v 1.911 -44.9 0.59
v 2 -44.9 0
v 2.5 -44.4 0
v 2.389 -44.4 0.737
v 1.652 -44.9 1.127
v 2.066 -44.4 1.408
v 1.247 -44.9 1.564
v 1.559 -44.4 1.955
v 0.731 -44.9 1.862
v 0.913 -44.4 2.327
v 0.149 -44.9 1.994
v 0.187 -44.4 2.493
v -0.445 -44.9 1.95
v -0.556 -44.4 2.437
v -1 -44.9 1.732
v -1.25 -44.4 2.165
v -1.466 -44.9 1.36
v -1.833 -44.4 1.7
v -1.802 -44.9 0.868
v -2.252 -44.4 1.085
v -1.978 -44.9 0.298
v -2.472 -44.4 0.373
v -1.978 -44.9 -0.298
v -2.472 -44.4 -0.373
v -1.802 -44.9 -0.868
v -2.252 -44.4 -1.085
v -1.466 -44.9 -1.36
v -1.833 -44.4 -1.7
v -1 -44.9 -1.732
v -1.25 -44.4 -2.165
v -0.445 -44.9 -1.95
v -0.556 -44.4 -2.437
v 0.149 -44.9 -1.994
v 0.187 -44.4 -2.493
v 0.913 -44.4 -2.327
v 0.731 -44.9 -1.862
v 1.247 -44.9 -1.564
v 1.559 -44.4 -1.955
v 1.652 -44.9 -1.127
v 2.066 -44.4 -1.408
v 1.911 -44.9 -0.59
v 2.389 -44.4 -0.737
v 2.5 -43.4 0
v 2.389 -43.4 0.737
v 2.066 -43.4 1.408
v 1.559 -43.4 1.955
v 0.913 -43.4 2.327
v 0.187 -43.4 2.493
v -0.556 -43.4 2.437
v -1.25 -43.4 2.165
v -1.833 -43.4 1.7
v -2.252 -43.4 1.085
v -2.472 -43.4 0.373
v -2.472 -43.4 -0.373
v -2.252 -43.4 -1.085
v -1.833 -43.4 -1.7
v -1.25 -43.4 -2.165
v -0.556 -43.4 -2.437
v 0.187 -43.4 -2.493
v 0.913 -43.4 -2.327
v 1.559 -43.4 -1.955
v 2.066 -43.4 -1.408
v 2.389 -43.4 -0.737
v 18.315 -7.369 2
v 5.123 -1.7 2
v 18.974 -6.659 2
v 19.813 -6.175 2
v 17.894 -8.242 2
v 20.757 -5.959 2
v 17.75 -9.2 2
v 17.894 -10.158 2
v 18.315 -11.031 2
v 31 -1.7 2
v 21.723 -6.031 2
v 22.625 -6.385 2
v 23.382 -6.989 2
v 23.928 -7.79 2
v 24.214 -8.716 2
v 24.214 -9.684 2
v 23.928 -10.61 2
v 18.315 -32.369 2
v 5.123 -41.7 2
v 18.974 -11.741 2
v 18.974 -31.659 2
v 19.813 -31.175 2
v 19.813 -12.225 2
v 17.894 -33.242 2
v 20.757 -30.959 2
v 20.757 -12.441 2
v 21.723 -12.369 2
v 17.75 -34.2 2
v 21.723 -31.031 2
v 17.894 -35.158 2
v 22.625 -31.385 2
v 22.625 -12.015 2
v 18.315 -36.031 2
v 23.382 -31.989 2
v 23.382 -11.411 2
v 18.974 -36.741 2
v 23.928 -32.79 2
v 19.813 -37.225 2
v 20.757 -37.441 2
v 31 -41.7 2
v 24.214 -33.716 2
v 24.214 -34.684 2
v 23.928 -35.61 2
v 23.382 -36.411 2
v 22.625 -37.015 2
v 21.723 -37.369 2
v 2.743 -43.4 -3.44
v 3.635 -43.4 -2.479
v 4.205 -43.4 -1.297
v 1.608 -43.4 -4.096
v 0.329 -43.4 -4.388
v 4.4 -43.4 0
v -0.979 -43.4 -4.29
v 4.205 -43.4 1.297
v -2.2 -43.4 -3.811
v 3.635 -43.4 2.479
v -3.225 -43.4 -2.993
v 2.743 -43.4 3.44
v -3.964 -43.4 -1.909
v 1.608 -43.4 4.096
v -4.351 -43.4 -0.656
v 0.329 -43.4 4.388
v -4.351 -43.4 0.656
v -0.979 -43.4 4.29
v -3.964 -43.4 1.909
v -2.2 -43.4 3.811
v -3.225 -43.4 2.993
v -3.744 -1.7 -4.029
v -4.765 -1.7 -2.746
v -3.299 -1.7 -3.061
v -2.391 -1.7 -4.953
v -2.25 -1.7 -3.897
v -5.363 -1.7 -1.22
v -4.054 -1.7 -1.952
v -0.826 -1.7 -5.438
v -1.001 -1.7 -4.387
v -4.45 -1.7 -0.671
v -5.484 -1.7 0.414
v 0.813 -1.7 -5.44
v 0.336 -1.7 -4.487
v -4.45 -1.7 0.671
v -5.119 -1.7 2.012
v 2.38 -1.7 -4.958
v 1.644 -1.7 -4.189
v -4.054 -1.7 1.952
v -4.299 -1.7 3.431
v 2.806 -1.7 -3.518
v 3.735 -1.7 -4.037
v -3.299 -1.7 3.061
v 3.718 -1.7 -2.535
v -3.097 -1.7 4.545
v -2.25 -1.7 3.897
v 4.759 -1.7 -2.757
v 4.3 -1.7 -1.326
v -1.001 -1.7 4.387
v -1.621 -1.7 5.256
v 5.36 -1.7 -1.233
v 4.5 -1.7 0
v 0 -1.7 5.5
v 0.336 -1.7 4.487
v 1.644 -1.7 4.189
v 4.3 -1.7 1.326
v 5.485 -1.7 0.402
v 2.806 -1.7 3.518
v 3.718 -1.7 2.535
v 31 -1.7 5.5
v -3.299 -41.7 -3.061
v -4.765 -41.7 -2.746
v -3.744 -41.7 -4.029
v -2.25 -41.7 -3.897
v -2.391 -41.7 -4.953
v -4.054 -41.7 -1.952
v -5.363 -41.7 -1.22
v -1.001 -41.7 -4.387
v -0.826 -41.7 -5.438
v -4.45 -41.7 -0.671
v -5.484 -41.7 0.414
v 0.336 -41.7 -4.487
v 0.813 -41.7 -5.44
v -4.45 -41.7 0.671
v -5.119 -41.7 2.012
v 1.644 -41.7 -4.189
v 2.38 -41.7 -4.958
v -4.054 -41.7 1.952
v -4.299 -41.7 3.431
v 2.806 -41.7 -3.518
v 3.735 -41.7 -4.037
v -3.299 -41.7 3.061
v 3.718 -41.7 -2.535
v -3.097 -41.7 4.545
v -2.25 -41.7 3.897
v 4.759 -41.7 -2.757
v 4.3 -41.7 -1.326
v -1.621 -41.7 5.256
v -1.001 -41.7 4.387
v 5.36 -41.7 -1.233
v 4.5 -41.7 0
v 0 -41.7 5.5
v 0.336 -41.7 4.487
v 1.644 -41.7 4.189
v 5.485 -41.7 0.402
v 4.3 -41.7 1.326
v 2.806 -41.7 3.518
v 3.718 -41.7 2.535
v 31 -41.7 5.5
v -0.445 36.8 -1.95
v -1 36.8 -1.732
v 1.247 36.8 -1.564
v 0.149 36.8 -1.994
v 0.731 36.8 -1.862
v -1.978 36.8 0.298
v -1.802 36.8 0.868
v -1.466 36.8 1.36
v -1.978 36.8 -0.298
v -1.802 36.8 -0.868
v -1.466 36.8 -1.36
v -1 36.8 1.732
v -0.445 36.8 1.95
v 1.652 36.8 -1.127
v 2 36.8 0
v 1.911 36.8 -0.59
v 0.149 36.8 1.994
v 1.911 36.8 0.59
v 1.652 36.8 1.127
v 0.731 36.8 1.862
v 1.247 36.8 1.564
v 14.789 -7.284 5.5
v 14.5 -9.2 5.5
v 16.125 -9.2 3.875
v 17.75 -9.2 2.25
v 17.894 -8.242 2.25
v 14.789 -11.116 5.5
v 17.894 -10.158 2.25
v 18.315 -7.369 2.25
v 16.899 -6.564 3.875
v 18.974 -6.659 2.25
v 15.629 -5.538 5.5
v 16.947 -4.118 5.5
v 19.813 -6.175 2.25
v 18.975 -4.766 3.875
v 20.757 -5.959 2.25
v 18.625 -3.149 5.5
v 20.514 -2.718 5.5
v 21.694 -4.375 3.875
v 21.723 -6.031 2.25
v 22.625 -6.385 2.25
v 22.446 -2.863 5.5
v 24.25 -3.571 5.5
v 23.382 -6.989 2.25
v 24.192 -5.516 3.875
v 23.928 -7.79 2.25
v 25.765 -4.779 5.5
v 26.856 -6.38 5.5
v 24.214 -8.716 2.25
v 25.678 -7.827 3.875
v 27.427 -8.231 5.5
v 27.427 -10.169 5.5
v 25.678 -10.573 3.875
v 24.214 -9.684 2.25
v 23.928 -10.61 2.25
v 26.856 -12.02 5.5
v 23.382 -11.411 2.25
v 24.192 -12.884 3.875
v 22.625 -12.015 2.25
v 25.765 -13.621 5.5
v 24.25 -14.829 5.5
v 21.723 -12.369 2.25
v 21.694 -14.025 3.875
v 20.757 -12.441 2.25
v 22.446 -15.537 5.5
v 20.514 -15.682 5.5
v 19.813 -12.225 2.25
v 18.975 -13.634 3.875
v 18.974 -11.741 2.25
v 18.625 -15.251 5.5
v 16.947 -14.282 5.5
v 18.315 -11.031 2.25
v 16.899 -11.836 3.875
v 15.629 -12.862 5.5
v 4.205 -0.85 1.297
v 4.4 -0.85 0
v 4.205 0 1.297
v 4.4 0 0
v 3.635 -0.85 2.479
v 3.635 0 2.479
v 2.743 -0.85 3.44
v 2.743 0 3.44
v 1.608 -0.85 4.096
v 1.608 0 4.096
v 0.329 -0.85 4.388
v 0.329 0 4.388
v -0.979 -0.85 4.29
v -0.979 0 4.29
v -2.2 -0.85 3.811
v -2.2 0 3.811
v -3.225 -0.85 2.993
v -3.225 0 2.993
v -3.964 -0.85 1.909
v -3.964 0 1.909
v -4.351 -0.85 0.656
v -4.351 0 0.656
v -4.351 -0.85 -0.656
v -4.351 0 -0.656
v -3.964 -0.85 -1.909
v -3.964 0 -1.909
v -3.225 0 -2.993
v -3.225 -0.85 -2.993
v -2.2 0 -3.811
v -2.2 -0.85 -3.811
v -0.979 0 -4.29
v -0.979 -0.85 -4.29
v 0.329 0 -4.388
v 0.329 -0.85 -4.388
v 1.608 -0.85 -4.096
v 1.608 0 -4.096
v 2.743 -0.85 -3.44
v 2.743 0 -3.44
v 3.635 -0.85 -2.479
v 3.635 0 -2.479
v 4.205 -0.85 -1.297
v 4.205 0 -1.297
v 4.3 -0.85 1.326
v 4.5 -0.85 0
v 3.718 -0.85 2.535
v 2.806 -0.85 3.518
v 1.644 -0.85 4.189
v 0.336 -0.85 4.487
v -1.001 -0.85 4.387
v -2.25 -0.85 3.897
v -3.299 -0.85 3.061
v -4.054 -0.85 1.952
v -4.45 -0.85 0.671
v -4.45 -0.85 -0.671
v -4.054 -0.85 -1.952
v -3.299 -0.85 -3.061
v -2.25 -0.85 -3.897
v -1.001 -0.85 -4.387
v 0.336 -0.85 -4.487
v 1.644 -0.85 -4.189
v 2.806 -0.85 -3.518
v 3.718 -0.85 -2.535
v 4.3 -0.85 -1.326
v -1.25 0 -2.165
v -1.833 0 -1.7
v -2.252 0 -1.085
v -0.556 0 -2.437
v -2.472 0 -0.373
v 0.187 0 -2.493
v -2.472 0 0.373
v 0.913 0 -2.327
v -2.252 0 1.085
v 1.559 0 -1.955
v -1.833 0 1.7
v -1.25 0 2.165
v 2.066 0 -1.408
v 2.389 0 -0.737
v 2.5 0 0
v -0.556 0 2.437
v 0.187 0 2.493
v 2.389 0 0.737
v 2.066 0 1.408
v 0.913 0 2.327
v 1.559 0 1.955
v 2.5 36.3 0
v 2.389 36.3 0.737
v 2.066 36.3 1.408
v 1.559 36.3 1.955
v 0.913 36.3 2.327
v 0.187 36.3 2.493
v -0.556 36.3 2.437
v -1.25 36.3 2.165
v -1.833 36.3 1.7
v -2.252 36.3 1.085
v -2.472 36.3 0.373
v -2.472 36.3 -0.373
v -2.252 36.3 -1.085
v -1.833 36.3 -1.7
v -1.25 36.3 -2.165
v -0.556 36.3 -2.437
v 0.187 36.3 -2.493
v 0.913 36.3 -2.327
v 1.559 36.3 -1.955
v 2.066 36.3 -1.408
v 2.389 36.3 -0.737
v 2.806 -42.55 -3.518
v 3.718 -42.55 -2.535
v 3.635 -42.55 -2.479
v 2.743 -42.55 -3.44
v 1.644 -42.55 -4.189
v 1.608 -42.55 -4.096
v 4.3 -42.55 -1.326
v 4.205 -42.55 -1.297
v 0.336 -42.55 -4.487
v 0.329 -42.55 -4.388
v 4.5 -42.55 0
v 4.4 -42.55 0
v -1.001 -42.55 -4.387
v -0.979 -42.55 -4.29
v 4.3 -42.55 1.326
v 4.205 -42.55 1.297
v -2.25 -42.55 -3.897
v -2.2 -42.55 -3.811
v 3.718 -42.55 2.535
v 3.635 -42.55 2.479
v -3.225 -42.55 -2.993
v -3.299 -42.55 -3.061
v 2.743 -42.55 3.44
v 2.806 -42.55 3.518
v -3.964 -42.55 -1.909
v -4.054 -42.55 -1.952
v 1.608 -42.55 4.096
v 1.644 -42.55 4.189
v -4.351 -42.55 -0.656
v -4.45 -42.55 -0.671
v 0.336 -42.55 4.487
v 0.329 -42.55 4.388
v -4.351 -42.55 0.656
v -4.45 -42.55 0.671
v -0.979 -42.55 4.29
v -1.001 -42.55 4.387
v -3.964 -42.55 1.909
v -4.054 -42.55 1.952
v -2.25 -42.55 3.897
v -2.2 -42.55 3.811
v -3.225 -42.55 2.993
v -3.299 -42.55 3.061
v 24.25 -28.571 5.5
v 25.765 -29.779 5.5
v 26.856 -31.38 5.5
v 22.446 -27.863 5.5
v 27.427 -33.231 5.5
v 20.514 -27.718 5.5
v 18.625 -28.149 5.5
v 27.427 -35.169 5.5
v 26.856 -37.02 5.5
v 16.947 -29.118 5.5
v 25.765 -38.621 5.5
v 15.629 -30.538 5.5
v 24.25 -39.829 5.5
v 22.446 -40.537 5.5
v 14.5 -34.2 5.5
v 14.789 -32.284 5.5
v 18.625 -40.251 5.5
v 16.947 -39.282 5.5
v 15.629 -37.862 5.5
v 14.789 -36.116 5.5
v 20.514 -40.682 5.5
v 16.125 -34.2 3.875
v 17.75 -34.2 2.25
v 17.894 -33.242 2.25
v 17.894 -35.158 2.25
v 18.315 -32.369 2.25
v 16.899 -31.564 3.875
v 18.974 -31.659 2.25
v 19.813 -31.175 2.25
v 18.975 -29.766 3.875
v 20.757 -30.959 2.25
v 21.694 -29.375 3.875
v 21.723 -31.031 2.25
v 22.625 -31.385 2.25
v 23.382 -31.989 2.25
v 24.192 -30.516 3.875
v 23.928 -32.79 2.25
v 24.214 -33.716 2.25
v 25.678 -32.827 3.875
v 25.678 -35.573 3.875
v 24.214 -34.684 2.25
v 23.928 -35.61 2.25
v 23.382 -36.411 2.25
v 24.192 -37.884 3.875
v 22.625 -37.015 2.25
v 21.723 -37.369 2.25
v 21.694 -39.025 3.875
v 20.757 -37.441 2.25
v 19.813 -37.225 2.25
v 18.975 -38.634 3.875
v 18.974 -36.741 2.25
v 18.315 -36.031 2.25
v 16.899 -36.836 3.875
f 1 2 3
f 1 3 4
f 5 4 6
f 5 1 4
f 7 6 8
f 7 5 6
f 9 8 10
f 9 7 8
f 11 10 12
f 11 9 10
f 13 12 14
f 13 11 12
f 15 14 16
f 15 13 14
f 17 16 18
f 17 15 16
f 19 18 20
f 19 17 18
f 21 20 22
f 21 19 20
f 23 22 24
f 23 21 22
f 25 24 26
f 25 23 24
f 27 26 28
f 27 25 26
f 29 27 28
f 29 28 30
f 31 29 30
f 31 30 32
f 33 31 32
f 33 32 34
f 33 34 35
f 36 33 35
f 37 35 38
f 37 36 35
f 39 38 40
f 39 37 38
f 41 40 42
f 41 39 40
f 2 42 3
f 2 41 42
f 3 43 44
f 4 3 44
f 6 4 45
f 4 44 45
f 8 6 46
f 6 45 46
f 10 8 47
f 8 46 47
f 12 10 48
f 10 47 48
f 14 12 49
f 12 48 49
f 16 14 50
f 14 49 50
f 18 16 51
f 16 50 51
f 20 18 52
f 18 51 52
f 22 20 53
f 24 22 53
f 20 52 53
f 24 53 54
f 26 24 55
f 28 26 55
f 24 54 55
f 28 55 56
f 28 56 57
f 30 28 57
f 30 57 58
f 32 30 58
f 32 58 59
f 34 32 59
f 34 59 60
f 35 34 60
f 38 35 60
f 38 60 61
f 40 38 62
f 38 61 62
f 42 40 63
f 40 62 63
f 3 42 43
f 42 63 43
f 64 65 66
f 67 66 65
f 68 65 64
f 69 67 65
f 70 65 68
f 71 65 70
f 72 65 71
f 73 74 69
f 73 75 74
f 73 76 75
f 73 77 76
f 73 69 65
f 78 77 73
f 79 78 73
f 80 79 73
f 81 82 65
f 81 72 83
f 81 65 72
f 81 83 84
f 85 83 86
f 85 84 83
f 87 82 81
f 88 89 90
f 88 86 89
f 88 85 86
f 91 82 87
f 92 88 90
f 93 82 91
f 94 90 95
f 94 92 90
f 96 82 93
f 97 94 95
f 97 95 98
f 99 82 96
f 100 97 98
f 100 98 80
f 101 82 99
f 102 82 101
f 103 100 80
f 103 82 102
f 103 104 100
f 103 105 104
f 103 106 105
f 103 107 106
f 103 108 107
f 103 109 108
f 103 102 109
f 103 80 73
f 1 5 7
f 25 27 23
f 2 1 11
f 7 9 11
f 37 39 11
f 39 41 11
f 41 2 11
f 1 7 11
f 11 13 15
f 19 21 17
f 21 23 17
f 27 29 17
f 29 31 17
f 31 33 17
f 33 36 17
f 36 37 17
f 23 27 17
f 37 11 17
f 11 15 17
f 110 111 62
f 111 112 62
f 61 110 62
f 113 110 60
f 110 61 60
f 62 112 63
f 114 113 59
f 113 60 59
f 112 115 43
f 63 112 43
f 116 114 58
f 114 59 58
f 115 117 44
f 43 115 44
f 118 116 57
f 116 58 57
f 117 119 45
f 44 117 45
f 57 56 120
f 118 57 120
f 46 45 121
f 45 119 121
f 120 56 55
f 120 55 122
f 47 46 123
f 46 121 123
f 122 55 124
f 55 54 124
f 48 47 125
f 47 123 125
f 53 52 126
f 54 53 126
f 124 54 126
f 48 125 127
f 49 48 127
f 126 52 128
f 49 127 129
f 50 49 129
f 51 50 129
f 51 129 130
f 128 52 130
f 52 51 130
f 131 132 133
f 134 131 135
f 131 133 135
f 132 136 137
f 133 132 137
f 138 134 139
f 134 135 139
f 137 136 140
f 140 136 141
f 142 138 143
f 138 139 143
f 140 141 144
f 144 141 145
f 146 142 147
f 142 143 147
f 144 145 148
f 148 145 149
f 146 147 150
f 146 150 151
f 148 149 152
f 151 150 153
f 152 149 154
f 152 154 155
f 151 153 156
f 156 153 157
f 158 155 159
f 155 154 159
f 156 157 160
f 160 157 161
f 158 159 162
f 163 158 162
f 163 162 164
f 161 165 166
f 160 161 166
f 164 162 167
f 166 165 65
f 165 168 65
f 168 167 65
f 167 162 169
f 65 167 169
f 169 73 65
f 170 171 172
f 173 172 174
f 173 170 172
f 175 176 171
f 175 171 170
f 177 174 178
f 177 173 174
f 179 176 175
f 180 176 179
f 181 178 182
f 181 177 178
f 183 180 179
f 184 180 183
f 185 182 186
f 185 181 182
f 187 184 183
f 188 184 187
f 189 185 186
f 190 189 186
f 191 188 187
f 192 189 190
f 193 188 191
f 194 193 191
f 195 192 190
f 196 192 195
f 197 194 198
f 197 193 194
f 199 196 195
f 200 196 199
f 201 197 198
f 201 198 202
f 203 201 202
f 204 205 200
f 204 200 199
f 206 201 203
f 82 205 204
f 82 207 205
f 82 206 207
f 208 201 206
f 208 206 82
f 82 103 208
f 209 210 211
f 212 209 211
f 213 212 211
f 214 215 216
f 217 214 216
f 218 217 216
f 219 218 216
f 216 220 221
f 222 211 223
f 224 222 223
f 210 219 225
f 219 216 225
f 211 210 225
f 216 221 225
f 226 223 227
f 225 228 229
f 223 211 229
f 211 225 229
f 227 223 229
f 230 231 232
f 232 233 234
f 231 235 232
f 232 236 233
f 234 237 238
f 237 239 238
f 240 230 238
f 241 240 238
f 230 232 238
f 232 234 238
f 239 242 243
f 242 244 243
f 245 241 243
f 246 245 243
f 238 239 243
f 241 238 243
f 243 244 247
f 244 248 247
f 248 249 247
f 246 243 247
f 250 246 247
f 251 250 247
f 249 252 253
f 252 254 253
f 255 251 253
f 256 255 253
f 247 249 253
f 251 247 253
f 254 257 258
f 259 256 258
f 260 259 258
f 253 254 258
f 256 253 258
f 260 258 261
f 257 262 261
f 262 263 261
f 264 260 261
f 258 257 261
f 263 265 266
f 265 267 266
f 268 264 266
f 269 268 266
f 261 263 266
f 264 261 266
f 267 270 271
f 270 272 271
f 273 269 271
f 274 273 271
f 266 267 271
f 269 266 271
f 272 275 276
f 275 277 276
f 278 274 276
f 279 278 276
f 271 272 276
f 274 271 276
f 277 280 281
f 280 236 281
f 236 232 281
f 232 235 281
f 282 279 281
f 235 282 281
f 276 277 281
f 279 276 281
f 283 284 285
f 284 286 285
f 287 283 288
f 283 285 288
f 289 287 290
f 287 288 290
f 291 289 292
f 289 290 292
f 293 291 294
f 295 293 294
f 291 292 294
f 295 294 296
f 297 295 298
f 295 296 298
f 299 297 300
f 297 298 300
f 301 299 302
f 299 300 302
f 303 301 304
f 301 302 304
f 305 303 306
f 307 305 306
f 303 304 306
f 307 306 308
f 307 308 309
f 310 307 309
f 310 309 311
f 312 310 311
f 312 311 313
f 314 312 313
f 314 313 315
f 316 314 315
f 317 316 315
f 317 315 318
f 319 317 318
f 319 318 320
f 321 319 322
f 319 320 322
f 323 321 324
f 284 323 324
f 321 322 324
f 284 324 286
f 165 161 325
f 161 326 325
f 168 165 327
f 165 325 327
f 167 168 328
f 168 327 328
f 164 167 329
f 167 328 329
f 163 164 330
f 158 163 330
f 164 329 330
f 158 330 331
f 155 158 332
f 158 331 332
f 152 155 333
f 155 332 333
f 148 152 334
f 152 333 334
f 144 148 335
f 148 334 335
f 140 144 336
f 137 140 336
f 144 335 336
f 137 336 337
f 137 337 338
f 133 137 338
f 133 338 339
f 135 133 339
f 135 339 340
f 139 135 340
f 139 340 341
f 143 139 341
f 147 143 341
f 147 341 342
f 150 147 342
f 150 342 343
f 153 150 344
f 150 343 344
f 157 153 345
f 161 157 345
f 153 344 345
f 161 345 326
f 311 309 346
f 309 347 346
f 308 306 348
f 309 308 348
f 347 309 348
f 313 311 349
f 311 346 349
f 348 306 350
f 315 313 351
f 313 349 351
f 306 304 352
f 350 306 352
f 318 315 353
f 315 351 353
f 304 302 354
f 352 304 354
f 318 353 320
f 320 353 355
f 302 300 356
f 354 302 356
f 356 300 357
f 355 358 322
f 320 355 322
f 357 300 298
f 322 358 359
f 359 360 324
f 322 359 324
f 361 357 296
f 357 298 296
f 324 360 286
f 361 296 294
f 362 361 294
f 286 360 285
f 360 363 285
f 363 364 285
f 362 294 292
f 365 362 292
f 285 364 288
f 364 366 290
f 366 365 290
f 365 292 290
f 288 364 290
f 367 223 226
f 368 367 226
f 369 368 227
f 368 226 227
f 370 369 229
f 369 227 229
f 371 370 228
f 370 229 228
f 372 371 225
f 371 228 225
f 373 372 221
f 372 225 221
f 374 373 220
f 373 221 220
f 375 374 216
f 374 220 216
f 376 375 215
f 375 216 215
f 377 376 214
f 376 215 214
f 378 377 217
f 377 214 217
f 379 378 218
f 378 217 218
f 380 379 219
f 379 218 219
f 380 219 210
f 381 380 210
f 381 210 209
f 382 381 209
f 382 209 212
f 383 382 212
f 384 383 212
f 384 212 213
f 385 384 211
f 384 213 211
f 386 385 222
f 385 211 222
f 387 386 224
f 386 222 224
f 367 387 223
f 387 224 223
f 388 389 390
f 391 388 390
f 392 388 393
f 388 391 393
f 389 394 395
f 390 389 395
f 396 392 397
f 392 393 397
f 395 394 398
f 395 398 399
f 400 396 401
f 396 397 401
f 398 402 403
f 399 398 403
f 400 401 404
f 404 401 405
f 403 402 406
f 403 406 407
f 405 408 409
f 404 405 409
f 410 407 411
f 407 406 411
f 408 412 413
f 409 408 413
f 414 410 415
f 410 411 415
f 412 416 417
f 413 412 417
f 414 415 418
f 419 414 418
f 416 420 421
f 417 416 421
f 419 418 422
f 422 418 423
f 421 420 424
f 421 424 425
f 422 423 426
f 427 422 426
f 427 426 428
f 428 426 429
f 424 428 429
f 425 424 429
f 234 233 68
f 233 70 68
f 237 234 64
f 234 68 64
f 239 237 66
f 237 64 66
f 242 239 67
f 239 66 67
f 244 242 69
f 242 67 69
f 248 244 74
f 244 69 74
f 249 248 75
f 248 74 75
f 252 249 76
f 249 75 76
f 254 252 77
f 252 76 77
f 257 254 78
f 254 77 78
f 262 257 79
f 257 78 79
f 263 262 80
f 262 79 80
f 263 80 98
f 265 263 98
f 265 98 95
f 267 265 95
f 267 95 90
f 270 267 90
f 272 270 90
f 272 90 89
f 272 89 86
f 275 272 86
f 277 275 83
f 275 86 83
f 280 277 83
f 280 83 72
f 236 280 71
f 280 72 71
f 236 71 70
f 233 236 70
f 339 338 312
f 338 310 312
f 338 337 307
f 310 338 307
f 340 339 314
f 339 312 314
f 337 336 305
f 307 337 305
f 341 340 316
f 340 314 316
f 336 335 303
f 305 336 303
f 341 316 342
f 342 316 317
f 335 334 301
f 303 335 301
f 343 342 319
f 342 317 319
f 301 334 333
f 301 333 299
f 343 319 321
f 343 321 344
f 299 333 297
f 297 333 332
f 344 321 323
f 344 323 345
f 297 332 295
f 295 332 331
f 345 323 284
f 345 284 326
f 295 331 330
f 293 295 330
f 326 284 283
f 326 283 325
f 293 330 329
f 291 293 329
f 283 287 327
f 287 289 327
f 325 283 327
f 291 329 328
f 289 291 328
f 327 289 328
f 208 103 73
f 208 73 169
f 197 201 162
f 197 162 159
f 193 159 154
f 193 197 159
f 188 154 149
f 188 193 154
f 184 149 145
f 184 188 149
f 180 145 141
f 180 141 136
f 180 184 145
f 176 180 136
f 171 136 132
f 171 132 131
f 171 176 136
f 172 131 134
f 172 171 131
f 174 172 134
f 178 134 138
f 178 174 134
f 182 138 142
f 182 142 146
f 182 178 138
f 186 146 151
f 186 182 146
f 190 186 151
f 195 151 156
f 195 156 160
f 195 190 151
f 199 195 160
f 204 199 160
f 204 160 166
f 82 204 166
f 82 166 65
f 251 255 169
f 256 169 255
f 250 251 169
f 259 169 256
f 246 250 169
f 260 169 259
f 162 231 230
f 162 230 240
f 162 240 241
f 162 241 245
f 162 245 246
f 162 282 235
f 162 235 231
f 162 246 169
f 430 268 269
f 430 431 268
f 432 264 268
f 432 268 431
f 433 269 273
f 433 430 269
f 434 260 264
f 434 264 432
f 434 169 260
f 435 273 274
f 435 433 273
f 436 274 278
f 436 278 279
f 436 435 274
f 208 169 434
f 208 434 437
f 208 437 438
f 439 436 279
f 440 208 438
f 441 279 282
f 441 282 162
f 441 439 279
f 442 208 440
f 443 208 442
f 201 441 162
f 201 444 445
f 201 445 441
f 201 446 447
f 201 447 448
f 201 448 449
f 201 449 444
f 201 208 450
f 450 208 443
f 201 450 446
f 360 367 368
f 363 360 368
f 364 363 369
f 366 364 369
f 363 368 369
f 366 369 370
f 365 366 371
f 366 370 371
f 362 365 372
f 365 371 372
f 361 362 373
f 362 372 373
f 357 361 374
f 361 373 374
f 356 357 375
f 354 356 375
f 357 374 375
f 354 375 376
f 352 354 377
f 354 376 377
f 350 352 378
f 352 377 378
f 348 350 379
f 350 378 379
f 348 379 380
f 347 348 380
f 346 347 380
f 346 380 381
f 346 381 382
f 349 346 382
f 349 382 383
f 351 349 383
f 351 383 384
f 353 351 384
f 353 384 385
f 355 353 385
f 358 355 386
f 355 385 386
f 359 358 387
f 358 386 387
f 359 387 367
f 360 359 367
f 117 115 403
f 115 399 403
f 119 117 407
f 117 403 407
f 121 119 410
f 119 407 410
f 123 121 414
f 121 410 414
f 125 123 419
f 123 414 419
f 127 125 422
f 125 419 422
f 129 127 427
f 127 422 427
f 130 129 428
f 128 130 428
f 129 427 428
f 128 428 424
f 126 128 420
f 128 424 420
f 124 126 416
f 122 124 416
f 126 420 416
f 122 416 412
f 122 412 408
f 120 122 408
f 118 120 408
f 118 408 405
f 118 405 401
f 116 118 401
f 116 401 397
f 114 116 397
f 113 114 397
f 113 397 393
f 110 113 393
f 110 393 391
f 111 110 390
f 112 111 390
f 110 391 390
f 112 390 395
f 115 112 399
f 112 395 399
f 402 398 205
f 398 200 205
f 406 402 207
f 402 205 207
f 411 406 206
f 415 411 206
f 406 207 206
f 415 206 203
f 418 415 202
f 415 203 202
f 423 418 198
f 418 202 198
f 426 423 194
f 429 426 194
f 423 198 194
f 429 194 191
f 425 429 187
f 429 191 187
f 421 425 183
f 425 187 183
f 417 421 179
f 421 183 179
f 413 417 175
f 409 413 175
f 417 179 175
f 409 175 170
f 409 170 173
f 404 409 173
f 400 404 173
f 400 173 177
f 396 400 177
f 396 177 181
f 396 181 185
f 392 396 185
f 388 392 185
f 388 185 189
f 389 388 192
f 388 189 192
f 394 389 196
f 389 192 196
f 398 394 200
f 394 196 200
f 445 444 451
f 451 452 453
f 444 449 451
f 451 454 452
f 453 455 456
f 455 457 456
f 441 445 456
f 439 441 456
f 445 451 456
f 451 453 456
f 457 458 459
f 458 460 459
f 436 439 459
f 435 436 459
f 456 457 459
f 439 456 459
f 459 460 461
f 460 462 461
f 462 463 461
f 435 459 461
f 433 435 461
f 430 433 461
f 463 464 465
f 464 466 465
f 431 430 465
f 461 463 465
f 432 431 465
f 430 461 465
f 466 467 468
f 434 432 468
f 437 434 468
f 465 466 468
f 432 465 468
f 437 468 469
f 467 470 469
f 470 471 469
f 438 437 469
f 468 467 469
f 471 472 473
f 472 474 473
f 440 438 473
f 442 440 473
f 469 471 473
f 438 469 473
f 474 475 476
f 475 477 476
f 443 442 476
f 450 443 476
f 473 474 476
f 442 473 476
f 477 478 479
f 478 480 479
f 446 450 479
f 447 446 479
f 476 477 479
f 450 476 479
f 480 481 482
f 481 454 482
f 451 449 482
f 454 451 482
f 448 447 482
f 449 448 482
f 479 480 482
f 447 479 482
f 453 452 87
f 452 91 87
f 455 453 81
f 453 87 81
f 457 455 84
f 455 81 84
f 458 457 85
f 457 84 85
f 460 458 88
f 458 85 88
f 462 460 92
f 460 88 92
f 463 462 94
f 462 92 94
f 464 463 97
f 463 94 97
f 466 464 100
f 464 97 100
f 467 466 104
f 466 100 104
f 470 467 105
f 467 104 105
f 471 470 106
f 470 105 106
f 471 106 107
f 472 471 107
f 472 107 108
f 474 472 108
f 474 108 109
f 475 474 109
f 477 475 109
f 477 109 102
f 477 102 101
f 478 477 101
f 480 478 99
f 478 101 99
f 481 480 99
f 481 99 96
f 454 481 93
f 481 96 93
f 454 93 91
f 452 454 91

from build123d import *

# Parameters (mm, degrees)
EXTRUDE1_DEPTH       = 40
HOLEWZD1_D           = 6.5
HOLEWZD1_DEPTH       = 11
HOLEWZD1_CSINK_D     = 13
HOLEWZD1_CSINK_ANGLE = 90
CHAMFER1_SIZE        = 0.5


with BuildPart() as part:
    # Sketch1 → Extrude1 (new body)
    with BuildSketch(Plane.XZ.offset(41.7)):
        with BuildLine():
            Line((31, 5.5), (0, 5.5))
            ThreePointArc((0, 5.5), (-3.102418411, -4.541475531), (5.123475383, 2))
            Line((5.123475383, 2), (31, 2))
            Line((31, 2), (31, 5.5))
        make_face()
    extrude(amount=-EXTRUDE1_DEPTH)

    # Sketch2 → Revolve1 (revolve)
    with BuildSketch(Plane.XY):
        Polygon((2.5, 36.8), (0, 36.8), (0, -1.7), (4.5, -1.7), (4.5, -0.85), (4.4, -0.85), (4.4, 0), (2.5, 0), align=None)
    revolve(axis=Axis((0, 36.8, 0), (0, -1, 0)))

    # Sketch3 → Revolve2 (revolve)
    with BuildSketch(Plane.XY):
        Polygon((4.5, -41.7), (0, -41.7), (0, -44.9), (2.5, -44.9), (2.5, -43.4), (4.4, -43.4), (4.4, -42.55), (4.5, -42.55), align=None)
    revolve(axis=Axis((0, -41.7, 0), (0, -1, 0)))

    # HoleWzd1
    with Locations(Plane.XY.offset(5.5)):
        with Locations((21, -34.2), (21, -9.2)):
            CounterSinkHole(HOLEWZD1_D / 2, HOLEWZD1_CSINK_D / 2, depth=HOLEWZD1_DEPTH, counter_sink_angle=HOLEWZD1_CSINK_ANGLE)

    # Chamfer1
    chamfer1_edges = [part.edges().sort_by_distance(p)[0] for p in [
        (-2.5, 36.8, 0),
        (-2.5, -44.9, 0),
    ]]
    chamfer(chamfer1_edges, length=CHAMFER1_SIZE)


solid = part.part
